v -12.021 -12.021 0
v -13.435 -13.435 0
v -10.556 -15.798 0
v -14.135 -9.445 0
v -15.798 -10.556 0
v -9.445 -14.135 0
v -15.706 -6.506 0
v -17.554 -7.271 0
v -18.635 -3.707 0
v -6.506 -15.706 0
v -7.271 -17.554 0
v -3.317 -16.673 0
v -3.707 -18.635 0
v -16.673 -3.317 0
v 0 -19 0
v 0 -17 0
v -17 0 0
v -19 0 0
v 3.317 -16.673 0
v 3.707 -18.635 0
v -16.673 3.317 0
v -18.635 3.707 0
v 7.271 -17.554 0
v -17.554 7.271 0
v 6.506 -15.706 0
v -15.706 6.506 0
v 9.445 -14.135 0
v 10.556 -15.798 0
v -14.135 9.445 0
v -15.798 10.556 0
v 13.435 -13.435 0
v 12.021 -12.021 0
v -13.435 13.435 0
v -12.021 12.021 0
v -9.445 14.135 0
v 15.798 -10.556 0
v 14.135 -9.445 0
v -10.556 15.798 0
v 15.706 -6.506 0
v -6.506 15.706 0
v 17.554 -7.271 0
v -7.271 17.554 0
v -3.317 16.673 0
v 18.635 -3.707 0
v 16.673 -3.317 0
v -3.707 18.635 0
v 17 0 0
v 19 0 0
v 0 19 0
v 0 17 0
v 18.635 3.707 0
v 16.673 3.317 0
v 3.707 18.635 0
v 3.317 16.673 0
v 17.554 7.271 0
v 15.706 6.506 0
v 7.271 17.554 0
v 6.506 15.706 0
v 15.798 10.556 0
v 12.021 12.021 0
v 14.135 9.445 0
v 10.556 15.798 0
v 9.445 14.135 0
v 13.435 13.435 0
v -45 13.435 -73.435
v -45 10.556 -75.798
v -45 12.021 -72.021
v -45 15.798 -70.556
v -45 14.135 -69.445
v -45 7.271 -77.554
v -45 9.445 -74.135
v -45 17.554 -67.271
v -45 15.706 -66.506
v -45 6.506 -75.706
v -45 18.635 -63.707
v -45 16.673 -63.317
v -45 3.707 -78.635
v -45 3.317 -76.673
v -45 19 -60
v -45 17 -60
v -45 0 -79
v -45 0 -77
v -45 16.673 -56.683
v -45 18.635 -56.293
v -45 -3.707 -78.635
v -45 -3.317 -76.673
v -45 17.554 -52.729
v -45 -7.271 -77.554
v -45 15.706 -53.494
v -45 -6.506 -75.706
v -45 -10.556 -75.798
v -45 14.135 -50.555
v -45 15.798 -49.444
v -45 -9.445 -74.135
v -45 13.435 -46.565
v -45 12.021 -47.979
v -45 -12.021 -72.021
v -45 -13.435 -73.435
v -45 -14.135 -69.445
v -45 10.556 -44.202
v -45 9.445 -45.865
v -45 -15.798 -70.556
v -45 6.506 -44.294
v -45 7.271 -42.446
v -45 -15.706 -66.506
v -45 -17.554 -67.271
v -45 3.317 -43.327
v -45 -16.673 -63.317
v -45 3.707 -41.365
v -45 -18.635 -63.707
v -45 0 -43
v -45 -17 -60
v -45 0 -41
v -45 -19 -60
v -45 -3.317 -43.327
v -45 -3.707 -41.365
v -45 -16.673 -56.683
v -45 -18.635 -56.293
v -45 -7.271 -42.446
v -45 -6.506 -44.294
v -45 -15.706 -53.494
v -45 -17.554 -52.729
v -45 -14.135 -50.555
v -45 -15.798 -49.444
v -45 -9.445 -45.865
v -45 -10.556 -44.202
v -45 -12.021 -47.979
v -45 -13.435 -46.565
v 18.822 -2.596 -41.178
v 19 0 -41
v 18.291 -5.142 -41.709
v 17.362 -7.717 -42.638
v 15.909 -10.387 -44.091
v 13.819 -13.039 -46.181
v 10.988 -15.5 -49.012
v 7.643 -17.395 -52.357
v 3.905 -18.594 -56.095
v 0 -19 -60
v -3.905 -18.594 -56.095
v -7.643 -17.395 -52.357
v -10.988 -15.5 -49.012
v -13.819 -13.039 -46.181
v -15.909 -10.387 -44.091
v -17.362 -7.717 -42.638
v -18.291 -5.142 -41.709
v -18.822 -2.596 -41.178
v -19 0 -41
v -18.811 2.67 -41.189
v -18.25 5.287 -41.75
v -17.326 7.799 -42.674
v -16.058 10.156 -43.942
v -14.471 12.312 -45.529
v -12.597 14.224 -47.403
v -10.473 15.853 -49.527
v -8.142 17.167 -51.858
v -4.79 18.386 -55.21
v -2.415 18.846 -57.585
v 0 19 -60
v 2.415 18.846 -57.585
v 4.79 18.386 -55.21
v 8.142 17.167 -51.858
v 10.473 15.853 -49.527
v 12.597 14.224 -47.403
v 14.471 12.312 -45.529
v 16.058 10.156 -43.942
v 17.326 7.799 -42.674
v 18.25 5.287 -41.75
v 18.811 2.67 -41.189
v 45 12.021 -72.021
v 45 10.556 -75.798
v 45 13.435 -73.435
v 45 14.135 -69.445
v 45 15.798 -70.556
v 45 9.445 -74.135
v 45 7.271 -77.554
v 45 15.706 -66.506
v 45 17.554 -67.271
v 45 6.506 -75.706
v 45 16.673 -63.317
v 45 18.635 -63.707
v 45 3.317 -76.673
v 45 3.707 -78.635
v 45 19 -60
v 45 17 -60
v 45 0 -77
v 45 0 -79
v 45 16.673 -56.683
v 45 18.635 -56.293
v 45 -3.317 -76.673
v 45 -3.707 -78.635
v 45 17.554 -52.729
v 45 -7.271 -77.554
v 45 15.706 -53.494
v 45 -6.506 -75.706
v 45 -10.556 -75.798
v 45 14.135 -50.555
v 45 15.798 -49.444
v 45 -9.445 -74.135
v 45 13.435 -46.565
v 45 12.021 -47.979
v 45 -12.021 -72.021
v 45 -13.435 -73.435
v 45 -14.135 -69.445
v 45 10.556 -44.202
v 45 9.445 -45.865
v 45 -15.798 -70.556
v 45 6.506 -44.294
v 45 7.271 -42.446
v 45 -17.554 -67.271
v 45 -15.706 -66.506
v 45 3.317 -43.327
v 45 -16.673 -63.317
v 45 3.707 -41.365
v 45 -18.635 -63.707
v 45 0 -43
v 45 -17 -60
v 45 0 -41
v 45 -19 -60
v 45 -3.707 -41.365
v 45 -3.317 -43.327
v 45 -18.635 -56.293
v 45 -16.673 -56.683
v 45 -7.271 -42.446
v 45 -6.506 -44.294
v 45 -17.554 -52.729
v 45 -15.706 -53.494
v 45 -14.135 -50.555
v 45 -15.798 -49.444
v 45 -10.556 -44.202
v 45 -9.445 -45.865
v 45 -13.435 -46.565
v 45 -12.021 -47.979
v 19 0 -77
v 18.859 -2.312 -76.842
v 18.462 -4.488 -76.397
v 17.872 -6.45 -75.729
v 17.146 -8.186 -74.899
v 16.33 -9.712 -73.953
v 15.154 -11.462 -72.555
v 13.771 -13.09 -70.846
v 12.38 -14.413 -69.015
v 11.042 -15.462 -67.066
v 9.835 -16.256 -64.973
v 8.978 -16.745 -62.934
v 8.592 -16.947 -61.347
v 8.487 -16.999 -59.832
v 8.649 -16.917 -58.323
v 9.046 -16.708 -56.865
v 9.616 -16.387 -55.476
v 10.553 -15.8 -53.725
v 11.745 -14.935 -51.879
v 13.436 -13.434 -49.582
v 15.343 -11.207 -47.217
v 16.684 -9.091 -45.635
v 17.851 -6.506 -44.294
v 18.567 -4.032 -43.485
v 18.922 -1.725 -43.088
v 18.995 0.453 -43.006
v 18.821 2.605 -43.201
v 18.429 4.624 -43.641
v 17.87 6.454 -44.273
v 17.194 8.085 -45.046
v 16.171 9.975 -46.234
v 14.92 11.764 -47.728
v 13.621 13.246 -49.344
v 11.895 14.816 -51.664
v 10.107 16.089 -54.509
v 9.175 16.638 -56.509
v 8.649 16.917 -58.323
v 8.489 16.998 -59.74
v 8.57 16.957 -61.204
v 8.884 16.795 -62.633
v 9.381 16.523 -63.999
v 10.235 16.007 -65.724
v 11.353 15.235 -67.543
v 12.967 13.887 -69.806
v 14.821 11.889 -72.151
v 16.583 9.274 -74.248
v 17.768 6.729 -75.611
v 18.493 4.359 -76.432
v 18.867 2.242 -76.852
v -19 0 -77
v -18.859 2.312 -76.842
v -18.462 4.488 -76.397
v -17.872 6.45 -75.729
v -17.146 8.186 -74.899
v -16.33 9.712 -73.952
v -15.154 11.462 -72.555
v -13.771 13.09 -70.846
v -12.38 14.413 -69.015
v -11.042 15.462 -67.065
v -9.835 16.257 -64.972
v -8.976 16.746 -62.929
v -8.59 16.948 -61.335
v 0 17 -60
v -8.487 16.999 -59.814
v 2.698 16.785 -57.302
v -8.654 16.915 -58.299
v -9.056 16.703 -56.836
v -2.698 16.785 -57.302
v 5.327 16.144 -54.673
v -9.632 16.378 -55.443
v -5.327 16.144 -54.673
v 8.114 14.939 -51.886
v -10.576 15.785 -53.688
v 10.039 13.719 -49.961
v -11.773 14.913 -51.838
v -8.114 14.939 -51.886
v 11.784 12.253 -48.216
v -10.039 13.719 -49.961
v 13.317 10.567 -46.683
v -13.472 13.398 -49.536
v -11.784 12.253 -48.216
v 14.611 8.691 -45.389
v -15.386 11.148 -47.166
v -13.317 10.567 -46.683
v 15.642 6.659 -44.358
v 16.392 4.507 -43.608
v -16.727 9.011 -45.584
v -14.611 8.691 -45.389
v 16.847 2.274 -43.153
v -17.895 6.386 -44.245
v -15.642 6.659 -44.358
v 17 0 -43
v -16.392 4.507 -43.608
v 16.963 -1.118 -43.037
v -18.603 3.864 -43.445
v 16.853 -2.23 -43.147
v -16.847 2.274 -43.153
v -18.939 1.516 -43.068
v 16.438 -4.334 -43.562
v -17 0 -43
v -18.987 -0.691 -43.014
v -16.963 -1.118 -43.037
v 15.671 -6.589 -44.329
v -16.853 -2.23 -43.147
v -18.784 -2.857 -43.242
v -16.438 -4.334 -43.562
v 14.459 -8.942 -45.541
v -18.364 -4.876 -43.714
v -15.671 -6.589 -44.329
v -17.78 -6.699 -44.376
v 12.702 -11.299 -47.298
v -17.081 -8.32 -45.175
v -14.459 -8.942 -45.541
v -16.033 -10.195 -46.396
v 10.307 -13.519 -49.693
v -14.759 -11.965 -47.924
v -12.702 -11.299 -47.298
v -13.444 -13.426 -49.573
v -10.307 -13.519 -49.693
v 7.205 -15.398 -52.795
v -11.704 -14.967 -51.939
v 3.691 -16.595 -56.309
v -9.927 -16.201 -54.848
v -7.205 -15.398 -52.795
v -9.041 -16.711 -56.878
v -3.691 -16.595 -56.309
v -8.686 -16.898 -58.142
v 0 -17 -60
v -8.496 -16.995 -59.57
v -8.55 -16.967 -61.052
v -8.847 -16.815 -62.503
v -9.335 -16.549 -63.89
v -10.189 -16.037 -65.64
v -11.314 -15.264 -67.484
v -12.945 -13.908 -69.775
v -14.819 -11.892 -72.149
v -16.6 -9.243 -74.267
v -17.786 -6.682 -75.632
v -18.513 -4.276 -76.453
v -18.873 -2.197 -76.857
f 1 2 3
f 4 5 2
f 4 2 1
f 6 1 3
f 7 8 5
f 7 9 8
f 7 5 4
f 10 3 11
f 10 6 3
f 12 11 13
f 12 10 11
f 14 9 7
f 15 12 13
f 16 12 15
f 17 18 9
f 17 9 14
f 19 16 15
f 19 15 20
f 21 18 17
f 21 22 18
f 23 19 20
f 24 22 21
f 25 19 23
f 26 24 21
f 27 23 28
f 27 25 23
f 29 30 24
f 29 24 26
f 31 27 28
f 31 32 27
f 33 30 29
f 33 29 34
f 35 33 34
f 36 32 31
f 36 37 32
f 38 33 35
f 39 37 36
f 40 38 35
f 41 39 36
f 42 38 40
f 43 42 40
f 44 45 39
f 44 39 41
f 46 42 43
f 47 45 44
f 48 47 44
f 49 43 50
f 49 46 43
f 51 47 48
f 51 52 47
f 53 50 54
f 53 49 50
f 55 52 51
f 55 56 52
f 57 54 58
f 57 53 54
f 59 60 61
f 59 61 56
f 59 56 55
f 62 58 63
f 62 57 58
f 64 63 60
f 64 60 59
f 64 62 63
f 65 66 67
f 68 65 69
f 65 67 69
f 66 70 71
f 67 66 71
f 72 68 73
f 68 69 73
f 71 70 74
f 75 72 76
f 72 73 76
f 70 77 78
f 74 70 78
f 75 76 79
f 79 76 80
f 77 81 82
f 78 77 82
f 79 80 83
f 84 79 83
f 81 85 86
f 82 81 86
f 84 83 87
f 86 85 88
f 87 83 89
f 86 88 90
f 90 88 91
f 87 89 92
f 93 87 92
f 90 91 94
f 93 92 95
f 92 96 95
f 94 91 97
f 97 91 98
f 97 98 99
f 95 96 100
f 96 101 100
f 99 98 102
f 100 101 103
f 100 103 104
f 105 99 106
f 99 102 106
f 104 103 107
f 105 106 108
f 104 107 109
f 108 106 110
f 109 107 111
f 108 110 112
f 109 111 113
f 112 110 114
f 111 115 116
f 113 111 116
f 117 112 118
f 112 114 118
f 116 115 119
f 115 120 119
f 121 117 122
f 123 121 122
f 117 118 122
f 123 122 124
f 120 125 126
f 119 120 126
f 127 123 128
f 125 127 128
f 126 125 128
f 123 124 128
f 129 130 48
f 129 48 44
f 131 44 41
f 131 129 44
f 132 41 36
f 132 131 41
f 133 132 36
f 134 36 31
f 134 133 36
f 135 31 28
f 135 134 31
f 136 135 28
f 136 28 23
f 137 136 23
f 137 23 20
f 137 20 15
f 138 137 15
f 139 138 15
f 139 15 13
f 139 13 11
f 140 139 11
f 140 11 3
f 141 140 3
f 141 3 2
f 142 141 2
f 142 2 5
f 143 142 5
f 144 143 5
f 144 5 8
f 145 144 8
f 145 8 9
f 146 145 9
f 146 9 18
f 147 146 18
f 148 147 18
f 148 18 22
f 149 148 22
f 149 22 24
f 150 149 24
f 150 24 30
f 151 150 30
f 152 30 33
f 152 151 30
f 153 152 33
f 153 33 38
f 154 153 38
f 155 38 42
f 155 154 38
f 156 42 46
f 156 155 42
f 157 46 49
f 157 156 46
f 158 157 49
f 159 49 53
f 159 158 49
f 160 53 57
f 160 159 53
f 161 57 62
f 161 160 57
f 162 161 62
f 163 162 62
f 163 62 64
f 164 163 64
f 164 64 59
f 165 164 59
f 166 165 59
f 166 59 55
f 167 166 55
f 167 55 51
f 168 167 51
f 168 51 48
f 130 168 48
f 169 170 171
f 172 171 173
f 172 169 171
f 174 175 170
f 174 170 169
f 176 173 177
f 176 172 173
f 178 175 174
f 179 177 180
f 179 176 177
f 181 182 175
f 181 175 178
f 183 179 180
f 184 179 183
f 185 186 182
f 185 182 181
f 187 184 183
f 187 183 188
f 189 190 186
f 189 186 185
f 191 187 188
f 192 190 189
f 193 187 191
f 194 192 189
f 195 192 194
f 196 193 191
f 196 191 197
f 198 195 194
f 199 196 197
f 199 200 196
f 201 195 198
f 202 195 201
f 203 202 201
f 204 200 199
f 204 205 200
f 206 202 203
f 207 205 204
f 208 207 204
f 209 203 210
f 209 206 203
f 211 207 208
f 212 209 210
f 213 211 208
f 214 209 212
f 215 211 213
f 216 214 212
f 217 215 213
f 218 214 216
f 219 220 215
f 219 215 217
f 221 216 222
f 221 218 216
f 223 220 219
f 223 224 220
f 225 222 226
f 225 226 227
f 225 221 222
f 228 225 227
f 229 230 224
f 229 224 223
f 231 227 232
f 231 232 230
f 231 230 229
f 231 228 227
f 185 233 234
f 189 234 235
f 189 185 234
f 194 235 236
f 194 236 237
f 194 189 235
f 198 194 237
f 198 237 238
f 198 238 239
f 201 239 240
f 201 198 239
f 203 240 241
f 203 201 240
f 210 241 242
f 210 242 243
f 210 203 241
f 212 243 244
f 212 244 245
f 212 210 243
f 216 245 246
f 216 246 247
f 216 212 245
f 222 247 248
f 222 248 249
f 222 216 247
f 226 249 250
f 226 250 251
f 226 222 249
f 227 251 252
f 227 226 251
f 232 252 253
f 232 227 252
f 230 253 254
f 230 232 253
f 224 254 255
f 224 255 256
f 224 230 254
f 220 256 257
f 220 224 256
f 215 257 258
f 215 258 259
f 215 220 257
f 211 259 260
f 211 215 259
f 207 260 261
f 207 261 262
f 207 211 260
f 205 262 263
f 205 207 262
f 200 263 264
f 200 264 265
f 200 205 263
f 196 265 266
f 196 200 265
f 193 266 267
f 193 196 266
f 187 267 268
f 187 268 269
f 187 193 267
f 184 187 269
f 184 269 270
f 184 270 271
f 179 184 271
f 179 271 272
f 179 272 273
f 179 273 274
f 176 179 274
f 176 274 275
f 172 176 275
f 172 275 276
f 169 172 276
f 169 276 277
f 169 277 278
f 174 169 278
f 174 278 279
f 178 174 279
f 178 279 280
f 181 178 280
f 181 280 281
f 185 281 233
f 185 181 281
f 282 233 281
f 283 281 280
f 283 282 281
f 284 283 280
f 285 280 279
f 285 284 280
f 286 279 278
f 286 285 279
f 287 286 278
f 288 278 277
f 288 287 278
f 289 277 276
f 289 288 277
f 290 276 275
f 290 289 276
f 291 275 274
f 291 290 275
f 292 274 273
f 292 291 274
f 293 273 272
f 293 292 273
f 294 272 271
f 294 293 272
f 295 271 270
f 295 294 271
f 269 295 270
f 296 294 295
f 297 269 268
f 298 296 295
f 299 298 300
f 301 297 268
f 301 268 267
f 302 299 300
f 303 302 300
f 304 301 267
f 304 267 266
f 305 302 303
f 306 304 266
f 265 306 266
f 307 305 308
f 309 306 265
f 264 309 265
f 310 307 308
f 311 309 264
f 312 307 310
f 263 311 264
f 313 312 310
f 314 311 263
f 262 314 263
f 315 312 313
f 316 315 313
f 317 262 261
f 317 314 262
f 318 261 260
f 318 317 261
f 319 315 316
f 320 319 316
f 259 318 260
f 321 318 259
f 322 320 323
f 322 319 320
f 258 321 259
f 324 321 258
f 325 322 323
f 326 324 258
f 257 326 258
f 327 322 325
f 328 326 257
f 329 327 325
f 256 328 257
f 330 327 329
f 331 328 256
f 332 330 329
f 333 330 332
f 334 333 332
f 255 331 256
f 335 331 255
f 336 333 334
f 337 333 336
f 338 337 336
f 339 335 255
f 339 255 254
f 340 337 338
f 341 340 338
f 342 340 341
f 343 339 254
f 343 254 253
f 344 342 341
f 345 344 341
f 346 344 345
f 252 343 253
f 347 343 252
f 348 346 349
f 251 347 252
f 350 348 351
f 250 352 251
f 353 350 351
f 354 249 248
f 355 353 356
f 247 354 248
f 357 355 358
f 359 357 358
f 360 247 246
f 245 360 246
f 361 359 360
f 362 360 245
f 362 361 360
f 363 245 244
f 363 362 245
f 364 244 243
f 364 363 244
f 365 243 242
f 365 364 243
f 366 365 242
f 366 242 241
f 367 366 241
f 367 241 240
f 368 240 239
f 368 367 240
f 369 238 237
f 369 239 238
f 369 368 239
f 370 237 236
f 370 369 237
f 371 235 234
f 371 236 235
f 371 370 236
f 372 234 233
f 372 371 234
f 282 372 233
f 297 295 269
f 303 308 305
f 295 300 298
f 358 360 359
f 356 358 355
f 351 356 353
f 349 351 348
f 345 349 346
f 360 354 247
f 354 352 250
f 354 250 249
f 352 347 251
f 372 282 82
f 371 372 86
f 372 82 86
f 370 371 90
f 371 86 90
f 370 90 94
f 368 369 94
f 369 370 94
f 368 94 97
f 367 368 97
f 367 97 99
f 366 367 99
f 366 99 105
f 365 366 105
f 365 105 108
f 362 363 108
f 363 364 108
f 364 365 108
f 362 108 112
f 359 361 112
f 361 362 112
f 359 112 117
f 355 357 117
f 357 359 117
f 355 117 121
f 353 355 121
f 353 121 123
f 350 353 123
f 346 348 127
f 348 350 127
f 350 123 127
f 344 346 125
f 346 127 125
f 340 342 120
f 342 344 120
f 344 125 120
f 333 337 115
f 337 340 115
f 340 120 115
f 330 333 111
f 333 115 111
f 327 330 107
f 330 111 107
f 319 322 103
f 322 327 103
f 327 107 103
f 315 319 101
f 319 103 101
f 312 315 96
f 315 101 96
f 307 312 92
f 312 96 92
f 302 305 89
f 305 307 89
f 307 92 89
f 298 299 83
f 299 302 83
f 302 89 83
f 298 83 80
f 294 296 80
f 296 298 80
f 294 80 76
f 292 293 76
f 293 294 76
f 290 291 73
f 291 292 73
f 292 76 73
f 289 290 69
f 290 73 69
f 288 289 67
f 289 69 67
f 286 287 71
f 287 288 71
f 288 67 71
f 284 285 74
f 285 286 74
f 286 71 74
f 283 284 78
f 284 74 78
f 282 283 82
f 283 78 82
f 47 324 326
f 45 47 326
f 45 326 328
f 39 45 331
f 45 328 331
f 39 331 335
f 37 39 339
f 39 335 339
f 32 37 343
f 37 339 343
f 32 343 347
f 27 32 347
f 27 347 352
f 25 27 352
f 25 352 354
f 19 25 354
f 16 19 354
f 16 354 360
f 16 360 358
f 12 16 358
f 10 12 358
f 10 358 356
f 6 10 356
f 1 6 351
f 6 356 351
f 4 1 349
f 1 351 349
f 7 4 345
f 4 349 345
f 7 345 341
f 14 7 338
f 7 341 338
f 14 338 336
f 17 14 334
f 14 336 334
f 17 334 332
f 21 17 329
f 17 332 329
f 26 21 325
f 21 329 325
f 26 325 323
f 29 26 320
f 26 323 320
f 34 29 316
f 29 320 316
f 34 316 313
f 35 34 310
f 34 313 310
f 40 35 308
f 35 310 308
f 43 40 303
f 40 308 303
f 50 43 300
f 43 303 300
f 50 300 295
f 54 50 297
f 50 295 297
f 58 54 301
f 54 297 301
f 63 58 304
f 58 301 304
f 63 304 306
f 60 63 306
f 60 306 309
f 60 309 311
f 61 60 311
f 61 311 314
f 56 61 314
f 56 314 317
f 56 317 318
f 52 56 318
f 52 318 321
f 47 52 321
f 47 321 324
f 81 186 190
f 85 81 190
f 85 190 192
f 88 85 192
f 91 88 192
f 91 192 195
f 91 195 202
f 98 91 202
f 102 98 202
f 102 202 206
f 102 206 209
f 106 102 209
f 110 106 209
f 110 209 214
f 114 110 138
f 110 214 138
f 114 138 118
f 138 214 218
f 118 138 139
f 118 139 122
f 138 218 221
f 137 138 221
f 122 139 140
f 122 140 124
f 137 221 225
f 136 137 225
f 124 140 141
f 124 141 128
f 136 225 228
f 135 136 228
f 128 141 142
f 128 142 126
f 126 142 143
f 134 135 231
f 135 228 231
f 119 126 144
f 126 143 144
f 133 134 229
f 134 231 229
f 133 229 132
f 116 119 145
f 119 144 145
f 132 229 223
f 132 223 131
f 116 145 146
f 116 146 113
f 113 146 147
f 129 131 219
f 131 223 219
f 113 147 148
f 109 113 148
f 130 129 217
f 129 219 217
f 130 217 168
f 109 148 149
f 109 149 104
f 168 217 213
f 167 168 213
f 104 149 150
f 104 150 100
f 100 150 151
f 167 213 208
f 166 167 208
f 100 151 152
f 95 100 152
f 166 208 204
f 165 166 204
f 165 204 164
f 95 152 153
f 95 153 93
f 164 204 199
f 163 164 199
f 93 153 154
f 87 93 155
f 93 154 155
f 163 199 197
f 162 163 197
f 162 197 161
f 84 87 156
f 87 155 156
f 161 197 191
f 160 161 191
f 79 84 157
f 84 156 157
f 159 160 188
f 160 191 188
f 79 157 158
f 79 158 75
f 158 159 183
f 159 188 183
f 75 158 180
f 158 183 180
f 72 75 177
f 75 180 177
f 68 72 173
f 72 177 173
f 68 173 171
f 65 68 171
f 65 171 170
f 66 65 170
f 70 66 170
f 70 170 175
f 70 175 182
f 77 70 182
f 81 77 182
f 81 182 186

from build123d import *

# Parameters (mm, degrees)
SKETCH1_R               = 19
SKETCH1_R_2             = 17
CUT_EXTRUDE1_DEPTH      = 93.881645167
CUT_EXTRUDE1_DEPTH_BACK = 93.881645167
SKETCH3_R               = 17


with BuildPart() as part:
    # Sweep1: sweep along a path in Sketch2
    with BuildLine(Plane(origin=(0, 0, 0), x_dir=(1, 0, 0), z_dir=(0, 1, 0))) as sweep1_path:
        Line((0, 0), (0, 60))
        Line((0, 60), (-45, 60))
    # Sketch1 → Sweep1 (sweep)
    with BuildSketch(Plane.XY):
        Circle(SKETCH1_R)
        Circle(SKETCH1_R_2, mode=Mode.SUBTRACT)
    sweep(path=sweep1_path.line, transition=Transition.RIGHT)

    # Mirror1: part across plane


with BuildPart() as part_1:
    add(part.part)
    add(part.part.mirror(Plane(origin=(0, 0, 0), x_dir=(0, 0, 1), z_dir=(1, 0, 0))))

    # Sketch3 → Cut-Extrude1 (cut, two sides: drawn at the far end of the back side and taken through both)
    with BuildSketch(Plane(origin=(0, 0, 0), x_dir=(0, 0, -1), z_dir=(1, 0, 0)).offset(-CUT_EXTRUDE1_DEPTH_BACK)):
        with Locations((60, 0)):
            Circle(SKETCH3_R)
    extrude(amount=CUT_EXTRUDE1_DEPTH + CUT_EXTRUDE1_DEPTH_BACK, mode=Mode.SUBTRACT)


solid = part_1.part
